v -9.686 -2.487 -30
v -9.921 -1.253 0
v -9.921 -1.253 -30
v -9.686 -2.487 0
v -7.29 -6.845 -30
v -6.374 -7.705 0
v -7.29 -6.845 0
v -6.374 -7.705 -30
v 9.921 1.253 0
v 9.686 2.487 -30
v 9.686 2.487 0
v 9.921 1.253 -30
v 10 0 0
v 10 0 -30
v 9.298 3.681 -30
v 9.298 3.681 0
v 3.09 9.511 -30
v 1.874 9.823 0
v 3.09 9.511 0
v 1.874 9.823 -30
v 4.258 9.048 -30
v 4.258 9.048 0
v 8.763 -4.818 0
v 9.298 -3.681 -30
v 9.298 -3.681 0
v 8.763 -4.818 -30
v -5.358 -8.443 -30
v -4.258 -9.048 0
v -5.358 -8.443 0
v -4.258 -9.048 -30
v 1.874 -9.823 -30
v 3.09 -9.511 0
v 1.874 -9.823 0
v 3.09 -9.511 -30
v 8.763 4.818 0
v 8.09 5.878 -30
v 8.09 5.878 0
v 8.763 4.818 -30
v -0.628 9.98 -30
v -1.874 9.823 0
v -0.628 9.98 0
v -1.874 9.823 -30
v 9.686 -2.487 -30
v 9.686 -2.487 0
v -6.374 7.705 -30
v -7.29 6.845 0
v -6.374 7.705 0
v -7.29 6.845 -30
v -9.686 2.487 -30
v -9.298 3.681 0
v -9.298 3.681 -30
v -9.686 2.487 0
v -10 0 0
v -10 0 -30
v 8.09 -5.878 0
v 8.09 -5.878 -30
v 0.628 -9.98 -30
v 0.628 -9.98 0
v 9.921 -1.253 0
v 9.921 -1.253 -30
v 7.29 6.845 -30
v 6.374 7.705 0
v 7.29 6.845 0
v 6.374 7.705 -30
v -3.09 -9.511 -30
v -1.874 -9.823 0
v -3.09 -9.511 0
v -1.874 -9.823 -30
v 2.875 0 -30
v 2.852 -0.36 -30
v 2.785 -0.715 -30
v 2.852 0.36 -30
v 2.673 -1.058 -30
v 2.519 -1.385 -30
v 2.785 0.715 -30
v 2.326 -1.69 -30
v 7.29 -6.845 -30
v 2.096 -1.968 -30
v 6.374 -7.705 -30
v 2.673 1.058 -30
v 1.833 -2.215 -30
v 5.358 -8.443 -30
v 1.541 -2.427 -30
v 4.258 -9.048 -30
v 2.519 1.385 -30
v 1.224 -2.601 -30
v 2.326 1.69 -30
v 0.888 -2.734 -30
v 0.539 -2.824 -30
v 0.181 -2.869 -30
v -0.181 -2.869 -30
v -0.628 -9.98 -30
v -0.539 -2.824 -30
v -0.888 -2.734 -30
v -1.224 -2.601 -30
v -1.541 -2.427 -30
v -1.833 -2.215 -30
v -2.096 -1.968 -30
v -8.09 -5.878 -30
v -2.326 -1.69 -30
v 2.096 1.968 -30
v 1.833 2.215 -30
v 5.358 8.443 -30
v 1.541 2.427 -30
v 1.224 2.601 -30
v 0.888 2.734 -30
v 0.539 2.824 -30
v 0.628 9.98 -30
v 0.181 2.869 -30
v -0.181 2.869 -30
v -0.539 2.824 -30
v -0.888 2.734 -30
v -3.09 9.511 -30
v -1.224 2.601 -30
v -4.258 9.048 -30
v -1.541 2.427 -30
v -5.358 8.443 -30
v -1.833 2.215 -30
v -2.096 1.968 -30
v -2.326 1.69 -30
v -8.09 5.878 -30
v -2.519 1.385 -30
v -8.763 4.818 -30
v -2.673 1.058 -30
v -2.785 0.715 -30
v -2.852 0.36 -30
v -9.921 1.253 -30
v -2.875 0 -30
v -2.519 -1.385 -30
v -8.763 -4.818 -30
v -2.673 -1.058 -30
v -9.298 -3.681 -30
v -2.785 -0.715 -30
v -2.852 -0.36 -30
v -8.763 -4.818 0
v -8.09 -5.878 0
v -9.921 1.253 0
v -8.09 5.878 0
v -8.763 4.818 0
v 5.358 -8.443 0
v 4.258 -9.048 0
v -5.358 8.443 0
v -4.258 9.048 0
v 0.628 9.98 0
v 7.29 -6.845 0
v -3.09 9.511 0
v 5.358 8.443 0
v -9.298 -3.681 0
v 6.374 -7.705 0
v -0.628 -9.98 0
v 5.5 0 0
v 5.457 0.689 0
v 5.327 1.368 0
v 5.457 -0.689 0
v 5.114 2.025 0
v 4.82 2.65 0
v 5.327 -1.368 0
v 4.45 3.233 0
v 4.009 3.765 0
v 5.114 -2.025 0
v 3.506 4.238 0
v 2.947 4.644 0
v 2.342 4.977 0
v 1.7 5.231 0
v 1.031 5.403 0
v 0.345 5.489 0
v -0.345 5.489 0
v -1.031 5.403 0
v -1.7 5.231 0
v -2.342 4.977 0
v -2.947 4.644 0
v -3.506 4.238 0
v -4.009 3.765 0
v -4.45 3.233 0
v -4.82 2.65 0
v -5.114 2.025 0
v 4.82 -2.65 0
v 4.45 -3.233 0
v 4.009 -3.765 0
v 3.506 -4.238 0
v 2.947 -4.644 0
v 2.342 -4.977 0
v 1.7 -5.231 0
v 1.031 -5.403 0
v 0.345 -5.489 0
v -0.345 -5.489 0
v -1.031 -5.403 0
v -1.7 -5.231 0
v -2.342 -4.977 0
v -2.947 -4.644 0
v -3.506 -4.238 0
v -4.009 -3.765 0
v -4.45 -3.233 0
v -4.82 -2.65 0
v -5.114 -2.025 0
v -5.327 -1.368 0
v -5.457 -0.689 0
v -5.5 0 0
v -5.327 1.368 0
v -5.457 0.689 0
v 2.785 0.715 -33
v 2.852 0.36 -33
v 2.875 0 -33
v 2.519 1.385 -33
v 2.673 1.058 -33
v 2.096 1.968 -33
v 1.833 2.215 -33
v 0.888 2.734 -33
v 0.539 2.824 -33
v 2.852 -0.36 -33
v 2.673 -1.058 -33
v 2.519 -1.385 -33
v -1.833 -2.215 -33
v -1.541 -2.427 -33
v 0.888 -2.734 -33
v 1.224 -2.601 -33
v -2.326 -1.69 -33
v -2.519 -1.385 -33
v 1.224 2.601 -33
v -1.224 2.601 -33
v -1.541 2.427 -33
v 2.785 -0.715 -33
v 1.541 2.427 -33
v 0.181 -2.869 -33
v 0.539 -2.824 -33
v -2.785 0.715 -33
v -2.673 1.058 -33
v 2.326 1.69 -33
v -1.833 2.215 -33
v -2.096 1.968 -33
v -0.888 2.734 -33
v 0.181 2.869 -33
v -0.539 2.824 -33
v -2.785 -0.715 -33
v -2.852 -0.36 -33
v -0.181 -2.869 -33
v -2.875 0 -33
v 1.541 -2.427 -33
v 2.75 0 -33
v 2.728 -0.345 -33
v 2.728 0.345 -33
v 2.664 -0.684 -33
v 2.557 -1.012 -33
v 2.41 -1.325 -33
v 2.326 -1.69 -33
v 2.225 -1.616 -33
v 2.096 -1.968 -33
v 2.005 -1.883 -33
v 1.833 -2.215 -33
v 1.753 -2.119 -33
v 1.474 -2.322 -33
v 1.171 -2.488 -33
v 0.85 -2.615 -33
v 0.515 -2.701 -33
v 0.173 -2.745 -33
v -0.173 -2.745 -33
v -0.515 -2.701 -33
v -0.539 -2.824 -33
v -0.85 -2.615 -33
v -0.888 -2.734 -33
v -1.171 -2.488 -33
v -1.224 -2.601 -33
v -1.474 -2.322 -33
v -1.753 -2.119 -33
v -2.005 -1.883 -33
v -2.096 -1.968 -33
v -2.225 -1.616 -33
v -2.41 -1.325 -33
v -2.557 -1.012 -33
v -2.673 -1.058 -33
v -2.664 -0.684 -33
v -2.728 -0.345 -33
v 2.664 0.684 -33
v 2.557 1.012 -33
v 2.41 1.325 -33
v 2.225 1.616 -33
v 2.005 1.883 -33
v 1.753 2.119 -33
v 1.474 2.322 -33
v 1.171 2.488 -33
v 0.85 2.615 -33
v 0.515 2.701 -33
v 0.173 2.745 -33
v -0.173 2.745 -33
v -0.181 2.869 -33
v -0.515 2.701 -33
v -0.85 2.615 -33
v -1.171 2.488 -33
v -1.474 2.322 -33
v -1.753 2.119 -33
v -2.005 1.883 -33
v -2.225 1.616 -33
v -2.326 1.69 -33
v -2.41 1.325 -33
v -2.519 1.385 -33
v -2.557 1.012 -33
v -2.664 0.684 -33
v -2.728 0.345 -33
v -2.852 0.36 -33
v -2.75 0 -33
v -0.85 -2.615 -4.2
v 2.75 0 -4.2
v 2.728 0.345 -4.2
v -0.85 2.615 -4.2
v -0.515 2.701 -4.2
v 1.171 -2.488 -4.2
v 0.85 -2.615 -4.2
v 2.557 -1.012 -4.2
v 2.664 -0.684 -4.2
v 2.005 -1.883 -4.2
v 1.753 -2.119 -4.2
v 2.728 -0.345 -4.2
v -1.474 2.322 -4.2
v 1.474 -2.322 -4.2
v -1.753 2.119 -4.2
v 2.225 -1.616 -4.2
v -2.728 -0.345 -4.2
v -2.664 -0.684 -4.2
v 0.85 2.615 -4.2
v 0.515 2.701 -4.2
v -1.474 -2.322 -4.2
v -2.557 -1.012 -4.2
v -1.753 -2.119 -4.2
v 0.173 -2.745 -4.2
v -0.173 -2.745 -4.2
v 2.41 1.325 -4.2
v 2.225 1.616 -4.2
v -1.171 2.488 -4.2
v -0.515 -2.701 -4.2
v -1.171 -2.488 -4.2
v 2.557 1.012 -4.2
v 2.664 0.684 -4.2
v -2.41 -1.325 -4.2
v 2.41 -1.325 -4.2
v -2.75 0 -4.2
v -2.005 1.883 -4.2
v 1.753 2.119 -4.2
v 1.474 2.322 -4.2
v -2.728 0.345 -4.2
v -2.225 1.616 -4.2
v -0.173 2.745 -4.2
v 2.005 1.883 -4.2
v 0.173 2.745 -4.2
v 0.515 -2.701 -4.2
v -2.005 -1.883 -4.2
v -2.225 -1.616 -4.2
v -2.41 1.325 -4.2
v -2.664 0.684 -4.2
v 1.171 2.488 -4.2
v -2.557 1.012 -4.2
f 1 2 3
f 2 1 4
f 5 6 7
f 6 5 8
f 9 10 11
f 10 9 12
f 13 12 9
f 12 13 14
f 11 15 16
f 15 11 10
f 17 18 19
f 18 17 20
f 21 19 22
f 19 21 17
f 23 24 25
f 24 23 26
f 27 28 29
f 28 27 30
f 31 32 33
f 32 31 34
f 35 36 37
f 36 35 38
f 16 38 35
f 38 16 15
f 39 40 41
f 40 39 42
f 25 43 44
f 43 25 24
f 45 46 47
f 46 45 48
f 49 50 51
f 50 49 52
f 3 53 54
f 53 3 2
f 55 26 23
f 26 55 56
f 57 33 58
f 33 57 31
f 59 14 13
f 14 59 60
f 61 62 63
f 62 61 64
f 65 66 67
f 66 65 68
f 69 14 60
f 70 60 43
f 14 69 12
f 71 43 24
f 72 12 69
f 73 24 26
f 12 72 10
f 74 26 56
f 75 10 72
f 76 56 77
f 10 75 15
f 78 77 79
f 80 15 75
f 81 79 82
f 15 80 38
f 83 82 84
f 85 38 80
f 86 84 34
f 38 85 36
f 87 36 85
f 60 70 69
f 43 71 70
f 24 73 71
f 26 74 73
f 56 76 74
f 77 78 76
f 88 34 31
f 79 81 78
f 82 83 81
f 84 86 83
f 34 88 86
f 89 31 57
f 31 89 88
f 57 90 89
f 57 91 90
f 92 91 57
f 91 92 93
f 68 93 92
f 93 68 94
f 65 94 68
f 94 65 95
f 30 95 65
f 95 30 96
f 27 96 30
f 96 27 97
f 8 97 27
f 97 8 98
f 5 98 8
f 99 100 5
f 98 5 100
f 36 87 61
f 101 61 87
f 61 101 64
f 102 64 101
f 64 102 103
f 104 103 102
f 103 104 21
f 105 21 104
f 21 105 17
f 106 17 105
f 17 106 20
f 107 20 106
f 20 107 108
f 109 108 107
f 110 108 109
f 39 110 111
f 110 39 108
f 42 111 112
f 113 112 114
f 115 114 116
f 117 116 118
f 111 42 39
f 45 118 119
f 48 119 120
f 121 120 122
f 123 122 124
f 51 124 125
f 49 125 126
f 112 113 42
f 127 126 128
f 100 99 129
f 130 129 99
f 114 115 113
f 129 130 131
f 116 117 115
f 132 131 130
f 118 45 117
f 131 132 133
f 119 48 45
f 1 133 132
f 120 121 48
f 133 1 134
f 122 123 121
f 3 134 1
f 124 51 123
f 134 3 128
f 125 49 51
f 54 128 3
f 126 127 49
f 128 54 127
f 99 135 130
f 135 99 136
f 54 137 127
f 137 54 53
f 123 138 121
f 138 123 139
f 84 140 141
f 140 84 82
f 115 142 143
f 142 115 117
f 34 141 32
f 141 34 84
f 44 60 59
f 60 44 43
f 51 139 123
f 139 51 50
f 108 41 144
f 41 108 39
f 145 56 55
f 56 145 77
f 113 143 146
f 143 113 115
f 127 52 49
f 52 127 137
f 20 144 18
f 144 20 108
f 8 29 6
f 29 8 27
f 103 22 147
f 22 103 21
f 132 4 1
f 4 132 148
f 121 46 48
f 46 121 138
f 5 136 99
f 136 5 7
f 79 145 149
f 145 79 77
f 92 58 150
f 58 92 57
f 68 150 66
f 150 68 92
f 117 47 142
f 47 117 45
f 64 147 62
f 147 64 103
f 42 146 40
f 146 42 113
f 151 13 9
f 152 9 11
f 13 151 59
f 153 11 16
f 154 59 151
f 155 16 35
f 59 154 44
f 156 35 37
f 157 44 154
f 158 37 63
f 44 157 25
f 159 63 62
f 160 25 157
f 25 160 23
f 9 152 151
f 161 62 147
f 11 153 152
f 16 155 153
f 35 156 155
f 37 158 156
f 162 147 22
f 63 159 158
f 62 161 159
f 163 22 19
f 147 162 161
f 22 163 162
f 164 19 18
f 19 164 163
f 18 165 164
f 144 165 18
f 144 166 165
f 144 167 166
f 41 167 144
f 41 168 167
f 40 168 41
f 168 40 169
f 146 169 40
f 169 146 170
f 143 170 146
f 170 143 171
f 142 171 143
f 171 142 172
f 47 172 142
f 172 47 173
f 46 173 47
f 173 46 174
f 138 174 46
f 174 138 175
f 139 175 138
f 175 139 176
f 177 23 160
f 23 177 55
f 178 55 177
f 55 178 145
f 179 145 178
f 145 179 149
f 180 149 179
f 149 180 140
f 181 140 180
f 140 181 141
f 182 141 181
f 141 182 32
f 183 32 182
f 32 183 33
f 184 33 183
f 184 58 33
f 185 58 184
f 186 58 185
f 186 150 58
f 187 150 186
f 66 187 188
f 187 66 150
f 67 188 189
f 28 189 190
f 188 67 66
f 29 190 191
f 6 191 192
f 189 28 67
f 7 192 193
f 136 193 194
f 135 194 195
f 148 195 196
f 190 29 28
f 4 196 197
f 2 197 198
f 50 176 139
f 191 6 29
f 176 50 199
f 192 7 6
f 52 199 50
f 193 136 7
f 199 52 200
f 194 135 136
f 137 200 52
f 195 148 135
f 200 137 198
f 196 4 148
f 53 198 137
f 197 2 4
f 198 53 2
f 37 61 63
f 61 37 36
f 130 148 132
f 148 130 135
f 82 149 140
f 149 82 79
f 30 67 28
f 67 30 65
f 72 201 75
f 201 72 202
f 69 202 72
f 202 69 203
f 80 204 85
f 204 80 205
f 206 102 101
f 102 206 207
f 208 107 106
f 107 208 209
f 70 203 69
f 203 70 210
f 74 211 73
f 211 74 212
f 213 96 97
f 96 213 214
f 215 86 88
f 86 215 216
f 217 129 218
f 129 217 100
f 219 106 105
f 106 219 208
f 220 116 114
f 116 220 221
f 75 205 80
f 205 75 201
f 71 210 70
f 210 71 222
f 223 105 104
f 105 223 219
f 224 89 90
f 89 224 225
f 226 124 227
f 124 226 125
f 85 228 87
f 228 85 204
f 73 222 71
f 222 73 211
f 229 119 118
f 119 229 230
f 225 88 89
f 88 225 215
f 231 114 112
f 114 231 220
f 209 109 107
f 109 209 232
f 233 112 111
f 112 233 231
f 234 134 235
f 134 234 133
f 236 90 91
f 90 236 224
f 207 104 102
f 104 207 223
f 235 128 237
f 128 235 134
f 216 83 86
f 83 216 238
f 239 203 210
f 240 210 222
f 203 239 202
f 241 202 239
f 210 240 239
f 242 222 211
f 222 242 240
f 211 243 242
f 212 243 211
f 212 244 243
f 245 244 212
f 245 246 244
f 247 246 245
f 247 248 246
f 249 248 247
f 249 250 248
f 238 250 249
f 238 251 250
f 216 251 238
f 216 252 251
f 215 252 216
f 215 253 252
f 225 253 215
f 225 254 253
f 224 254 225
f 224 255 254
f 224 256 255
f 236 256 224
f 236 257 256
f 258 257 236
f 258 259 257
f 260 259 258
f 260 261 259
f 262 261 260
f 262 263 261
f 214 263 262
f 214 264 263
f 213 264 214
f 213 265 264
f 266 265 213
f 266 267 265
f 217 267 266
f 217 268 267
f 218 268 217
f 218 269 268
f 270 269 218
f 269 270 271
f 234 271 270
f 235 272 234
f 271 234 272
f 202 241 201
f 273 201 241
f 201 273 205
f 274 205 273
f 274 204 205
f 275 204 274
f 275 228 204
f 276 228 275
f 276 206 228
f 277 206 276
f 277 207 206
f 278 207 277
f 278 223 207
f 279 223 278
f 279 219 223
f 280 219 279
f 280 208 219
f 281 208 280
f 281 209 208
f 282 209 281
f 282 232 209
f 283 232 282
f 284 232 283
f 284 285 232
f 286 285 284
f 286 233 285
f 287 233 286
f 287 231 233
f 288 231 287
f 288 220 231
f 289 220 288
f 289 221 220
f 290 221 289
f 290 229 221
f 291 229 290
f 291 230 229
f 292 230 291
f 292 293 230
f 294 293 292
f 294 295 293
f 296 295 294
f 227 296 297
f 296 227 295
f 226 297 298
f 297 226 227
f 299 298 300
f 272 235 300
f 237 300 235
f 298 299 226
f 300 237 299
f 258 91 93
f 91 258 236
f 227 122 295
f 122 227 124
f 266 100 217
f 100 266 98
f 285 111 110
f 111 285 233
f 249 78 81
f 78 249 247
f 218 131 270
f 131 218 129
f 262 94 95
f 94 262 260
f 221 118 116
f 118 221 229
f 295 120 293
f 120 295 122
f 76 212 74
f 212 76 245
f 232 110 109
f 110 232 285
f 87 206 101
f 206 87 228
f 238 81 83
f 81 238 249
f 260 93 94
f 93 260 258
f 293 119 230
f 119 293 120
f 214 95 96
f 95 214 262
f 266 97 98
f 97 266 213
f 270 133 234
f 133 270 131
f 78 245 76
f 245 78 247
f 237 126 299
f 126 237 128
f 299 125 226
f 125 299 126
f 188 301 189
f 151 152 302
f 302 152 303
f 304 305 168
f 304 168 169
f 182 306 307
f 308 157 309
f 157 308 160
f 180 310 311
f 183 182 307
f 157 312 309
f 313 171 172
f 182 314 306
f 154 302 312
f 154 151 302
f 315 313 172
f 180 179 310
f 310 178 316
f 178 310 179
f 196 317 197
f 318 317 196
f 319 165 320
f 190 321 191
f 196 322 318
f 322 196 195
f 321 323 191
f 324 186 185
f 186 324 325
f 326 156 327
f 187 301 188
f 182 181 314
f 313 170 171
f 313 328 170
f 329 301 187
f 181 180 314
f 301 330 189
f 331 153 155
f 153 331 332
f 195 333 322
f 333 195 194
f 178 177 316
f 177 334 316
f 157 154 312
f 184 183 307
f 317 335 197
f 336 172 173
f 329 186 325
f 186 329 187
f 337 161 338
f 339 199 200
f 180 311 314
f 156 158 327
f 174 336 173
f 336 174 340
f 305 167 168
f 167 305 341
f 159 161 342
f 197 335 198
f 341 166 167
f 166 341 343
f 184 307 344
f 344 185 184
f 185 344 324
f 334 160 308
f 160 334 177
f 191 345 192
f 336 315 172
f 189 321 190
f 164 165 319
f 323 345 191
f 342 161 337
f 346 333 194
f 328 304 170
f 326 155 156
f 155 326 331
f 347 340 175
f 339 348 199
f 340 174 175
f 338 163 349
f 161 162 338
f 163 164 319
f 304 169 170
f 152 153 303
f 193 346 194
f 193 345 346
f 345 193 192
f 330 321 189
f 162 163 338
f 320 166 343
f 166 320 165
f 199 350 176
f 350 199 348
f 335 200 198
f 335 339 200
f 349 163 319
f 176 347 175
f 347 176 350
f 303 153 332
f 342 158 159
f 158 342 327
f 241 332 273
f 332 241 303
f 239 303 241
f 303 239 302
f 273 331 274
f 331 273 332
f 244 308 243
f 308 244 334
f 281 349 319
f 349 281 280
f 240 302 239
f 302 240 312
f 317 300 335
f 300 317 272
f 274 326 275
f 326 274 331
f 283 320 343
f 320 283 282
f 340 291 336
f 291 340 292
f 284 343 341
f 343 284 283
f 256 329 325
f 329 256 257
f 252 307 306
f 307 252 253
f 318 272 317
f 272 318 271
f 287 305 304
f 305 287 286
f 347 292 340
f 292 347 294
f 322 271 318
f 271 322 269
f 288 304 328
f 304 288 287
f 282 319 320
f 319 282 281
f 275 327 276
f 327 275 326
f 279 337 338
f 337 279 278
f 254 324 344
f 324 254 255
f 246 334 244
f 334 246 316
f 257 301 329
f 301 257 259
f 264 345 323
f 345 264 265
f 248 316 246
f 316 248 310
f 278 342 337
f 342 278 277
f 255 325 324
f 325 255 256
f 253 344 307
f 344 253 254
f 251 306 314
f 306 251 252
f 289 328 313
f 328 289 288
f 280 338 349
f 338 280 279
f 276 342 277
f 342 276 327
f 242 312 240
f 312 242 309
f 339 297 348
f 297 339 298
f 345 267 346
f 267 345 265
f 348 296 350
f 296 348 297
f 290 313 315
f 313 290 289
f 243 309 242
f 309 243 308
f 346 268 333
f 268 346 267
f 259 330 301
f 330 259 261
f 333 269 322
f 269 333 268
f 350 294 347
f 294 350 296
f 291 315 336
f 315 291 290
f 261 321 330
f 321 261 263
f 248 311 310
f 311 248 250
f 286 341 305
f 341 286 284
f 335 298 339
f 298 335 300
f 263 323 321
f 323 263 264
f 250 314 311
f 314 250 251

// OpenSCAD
$fn = 50;

difference() {
	union() {
		translate(v = [0, 0, -30.0]) {
			cylinder(h = 30, r = 10.0);
		}
		#translate(v = [0, 0, -33.0]) {
			cylinder(h = 33, r = 2.875);
		}
	}
	union() {
		translate(v = [0, 0, 0]) {
			rotate(a = [0, 0, 0]) {
				difference() {
					union() {
						translate(v = [0, 0, -33.0]) {
							cylinder(h = 33, r = 2.25);
						}
						translate(v = [0, 0, -4.2]) {
							cylinder(h = 4.2, r1 = 2.75, r2 = 5.5);
						}
						translate(v = [0, 0, -33.0]) {
							cylinder(h = 33, r = 2.75);
						}
						translate(v = [0, 0, -33.0]) {
							cylinder(h = 33, r = 2.25);
						}
					}
					union();
				}
			}
		}
	}
}
